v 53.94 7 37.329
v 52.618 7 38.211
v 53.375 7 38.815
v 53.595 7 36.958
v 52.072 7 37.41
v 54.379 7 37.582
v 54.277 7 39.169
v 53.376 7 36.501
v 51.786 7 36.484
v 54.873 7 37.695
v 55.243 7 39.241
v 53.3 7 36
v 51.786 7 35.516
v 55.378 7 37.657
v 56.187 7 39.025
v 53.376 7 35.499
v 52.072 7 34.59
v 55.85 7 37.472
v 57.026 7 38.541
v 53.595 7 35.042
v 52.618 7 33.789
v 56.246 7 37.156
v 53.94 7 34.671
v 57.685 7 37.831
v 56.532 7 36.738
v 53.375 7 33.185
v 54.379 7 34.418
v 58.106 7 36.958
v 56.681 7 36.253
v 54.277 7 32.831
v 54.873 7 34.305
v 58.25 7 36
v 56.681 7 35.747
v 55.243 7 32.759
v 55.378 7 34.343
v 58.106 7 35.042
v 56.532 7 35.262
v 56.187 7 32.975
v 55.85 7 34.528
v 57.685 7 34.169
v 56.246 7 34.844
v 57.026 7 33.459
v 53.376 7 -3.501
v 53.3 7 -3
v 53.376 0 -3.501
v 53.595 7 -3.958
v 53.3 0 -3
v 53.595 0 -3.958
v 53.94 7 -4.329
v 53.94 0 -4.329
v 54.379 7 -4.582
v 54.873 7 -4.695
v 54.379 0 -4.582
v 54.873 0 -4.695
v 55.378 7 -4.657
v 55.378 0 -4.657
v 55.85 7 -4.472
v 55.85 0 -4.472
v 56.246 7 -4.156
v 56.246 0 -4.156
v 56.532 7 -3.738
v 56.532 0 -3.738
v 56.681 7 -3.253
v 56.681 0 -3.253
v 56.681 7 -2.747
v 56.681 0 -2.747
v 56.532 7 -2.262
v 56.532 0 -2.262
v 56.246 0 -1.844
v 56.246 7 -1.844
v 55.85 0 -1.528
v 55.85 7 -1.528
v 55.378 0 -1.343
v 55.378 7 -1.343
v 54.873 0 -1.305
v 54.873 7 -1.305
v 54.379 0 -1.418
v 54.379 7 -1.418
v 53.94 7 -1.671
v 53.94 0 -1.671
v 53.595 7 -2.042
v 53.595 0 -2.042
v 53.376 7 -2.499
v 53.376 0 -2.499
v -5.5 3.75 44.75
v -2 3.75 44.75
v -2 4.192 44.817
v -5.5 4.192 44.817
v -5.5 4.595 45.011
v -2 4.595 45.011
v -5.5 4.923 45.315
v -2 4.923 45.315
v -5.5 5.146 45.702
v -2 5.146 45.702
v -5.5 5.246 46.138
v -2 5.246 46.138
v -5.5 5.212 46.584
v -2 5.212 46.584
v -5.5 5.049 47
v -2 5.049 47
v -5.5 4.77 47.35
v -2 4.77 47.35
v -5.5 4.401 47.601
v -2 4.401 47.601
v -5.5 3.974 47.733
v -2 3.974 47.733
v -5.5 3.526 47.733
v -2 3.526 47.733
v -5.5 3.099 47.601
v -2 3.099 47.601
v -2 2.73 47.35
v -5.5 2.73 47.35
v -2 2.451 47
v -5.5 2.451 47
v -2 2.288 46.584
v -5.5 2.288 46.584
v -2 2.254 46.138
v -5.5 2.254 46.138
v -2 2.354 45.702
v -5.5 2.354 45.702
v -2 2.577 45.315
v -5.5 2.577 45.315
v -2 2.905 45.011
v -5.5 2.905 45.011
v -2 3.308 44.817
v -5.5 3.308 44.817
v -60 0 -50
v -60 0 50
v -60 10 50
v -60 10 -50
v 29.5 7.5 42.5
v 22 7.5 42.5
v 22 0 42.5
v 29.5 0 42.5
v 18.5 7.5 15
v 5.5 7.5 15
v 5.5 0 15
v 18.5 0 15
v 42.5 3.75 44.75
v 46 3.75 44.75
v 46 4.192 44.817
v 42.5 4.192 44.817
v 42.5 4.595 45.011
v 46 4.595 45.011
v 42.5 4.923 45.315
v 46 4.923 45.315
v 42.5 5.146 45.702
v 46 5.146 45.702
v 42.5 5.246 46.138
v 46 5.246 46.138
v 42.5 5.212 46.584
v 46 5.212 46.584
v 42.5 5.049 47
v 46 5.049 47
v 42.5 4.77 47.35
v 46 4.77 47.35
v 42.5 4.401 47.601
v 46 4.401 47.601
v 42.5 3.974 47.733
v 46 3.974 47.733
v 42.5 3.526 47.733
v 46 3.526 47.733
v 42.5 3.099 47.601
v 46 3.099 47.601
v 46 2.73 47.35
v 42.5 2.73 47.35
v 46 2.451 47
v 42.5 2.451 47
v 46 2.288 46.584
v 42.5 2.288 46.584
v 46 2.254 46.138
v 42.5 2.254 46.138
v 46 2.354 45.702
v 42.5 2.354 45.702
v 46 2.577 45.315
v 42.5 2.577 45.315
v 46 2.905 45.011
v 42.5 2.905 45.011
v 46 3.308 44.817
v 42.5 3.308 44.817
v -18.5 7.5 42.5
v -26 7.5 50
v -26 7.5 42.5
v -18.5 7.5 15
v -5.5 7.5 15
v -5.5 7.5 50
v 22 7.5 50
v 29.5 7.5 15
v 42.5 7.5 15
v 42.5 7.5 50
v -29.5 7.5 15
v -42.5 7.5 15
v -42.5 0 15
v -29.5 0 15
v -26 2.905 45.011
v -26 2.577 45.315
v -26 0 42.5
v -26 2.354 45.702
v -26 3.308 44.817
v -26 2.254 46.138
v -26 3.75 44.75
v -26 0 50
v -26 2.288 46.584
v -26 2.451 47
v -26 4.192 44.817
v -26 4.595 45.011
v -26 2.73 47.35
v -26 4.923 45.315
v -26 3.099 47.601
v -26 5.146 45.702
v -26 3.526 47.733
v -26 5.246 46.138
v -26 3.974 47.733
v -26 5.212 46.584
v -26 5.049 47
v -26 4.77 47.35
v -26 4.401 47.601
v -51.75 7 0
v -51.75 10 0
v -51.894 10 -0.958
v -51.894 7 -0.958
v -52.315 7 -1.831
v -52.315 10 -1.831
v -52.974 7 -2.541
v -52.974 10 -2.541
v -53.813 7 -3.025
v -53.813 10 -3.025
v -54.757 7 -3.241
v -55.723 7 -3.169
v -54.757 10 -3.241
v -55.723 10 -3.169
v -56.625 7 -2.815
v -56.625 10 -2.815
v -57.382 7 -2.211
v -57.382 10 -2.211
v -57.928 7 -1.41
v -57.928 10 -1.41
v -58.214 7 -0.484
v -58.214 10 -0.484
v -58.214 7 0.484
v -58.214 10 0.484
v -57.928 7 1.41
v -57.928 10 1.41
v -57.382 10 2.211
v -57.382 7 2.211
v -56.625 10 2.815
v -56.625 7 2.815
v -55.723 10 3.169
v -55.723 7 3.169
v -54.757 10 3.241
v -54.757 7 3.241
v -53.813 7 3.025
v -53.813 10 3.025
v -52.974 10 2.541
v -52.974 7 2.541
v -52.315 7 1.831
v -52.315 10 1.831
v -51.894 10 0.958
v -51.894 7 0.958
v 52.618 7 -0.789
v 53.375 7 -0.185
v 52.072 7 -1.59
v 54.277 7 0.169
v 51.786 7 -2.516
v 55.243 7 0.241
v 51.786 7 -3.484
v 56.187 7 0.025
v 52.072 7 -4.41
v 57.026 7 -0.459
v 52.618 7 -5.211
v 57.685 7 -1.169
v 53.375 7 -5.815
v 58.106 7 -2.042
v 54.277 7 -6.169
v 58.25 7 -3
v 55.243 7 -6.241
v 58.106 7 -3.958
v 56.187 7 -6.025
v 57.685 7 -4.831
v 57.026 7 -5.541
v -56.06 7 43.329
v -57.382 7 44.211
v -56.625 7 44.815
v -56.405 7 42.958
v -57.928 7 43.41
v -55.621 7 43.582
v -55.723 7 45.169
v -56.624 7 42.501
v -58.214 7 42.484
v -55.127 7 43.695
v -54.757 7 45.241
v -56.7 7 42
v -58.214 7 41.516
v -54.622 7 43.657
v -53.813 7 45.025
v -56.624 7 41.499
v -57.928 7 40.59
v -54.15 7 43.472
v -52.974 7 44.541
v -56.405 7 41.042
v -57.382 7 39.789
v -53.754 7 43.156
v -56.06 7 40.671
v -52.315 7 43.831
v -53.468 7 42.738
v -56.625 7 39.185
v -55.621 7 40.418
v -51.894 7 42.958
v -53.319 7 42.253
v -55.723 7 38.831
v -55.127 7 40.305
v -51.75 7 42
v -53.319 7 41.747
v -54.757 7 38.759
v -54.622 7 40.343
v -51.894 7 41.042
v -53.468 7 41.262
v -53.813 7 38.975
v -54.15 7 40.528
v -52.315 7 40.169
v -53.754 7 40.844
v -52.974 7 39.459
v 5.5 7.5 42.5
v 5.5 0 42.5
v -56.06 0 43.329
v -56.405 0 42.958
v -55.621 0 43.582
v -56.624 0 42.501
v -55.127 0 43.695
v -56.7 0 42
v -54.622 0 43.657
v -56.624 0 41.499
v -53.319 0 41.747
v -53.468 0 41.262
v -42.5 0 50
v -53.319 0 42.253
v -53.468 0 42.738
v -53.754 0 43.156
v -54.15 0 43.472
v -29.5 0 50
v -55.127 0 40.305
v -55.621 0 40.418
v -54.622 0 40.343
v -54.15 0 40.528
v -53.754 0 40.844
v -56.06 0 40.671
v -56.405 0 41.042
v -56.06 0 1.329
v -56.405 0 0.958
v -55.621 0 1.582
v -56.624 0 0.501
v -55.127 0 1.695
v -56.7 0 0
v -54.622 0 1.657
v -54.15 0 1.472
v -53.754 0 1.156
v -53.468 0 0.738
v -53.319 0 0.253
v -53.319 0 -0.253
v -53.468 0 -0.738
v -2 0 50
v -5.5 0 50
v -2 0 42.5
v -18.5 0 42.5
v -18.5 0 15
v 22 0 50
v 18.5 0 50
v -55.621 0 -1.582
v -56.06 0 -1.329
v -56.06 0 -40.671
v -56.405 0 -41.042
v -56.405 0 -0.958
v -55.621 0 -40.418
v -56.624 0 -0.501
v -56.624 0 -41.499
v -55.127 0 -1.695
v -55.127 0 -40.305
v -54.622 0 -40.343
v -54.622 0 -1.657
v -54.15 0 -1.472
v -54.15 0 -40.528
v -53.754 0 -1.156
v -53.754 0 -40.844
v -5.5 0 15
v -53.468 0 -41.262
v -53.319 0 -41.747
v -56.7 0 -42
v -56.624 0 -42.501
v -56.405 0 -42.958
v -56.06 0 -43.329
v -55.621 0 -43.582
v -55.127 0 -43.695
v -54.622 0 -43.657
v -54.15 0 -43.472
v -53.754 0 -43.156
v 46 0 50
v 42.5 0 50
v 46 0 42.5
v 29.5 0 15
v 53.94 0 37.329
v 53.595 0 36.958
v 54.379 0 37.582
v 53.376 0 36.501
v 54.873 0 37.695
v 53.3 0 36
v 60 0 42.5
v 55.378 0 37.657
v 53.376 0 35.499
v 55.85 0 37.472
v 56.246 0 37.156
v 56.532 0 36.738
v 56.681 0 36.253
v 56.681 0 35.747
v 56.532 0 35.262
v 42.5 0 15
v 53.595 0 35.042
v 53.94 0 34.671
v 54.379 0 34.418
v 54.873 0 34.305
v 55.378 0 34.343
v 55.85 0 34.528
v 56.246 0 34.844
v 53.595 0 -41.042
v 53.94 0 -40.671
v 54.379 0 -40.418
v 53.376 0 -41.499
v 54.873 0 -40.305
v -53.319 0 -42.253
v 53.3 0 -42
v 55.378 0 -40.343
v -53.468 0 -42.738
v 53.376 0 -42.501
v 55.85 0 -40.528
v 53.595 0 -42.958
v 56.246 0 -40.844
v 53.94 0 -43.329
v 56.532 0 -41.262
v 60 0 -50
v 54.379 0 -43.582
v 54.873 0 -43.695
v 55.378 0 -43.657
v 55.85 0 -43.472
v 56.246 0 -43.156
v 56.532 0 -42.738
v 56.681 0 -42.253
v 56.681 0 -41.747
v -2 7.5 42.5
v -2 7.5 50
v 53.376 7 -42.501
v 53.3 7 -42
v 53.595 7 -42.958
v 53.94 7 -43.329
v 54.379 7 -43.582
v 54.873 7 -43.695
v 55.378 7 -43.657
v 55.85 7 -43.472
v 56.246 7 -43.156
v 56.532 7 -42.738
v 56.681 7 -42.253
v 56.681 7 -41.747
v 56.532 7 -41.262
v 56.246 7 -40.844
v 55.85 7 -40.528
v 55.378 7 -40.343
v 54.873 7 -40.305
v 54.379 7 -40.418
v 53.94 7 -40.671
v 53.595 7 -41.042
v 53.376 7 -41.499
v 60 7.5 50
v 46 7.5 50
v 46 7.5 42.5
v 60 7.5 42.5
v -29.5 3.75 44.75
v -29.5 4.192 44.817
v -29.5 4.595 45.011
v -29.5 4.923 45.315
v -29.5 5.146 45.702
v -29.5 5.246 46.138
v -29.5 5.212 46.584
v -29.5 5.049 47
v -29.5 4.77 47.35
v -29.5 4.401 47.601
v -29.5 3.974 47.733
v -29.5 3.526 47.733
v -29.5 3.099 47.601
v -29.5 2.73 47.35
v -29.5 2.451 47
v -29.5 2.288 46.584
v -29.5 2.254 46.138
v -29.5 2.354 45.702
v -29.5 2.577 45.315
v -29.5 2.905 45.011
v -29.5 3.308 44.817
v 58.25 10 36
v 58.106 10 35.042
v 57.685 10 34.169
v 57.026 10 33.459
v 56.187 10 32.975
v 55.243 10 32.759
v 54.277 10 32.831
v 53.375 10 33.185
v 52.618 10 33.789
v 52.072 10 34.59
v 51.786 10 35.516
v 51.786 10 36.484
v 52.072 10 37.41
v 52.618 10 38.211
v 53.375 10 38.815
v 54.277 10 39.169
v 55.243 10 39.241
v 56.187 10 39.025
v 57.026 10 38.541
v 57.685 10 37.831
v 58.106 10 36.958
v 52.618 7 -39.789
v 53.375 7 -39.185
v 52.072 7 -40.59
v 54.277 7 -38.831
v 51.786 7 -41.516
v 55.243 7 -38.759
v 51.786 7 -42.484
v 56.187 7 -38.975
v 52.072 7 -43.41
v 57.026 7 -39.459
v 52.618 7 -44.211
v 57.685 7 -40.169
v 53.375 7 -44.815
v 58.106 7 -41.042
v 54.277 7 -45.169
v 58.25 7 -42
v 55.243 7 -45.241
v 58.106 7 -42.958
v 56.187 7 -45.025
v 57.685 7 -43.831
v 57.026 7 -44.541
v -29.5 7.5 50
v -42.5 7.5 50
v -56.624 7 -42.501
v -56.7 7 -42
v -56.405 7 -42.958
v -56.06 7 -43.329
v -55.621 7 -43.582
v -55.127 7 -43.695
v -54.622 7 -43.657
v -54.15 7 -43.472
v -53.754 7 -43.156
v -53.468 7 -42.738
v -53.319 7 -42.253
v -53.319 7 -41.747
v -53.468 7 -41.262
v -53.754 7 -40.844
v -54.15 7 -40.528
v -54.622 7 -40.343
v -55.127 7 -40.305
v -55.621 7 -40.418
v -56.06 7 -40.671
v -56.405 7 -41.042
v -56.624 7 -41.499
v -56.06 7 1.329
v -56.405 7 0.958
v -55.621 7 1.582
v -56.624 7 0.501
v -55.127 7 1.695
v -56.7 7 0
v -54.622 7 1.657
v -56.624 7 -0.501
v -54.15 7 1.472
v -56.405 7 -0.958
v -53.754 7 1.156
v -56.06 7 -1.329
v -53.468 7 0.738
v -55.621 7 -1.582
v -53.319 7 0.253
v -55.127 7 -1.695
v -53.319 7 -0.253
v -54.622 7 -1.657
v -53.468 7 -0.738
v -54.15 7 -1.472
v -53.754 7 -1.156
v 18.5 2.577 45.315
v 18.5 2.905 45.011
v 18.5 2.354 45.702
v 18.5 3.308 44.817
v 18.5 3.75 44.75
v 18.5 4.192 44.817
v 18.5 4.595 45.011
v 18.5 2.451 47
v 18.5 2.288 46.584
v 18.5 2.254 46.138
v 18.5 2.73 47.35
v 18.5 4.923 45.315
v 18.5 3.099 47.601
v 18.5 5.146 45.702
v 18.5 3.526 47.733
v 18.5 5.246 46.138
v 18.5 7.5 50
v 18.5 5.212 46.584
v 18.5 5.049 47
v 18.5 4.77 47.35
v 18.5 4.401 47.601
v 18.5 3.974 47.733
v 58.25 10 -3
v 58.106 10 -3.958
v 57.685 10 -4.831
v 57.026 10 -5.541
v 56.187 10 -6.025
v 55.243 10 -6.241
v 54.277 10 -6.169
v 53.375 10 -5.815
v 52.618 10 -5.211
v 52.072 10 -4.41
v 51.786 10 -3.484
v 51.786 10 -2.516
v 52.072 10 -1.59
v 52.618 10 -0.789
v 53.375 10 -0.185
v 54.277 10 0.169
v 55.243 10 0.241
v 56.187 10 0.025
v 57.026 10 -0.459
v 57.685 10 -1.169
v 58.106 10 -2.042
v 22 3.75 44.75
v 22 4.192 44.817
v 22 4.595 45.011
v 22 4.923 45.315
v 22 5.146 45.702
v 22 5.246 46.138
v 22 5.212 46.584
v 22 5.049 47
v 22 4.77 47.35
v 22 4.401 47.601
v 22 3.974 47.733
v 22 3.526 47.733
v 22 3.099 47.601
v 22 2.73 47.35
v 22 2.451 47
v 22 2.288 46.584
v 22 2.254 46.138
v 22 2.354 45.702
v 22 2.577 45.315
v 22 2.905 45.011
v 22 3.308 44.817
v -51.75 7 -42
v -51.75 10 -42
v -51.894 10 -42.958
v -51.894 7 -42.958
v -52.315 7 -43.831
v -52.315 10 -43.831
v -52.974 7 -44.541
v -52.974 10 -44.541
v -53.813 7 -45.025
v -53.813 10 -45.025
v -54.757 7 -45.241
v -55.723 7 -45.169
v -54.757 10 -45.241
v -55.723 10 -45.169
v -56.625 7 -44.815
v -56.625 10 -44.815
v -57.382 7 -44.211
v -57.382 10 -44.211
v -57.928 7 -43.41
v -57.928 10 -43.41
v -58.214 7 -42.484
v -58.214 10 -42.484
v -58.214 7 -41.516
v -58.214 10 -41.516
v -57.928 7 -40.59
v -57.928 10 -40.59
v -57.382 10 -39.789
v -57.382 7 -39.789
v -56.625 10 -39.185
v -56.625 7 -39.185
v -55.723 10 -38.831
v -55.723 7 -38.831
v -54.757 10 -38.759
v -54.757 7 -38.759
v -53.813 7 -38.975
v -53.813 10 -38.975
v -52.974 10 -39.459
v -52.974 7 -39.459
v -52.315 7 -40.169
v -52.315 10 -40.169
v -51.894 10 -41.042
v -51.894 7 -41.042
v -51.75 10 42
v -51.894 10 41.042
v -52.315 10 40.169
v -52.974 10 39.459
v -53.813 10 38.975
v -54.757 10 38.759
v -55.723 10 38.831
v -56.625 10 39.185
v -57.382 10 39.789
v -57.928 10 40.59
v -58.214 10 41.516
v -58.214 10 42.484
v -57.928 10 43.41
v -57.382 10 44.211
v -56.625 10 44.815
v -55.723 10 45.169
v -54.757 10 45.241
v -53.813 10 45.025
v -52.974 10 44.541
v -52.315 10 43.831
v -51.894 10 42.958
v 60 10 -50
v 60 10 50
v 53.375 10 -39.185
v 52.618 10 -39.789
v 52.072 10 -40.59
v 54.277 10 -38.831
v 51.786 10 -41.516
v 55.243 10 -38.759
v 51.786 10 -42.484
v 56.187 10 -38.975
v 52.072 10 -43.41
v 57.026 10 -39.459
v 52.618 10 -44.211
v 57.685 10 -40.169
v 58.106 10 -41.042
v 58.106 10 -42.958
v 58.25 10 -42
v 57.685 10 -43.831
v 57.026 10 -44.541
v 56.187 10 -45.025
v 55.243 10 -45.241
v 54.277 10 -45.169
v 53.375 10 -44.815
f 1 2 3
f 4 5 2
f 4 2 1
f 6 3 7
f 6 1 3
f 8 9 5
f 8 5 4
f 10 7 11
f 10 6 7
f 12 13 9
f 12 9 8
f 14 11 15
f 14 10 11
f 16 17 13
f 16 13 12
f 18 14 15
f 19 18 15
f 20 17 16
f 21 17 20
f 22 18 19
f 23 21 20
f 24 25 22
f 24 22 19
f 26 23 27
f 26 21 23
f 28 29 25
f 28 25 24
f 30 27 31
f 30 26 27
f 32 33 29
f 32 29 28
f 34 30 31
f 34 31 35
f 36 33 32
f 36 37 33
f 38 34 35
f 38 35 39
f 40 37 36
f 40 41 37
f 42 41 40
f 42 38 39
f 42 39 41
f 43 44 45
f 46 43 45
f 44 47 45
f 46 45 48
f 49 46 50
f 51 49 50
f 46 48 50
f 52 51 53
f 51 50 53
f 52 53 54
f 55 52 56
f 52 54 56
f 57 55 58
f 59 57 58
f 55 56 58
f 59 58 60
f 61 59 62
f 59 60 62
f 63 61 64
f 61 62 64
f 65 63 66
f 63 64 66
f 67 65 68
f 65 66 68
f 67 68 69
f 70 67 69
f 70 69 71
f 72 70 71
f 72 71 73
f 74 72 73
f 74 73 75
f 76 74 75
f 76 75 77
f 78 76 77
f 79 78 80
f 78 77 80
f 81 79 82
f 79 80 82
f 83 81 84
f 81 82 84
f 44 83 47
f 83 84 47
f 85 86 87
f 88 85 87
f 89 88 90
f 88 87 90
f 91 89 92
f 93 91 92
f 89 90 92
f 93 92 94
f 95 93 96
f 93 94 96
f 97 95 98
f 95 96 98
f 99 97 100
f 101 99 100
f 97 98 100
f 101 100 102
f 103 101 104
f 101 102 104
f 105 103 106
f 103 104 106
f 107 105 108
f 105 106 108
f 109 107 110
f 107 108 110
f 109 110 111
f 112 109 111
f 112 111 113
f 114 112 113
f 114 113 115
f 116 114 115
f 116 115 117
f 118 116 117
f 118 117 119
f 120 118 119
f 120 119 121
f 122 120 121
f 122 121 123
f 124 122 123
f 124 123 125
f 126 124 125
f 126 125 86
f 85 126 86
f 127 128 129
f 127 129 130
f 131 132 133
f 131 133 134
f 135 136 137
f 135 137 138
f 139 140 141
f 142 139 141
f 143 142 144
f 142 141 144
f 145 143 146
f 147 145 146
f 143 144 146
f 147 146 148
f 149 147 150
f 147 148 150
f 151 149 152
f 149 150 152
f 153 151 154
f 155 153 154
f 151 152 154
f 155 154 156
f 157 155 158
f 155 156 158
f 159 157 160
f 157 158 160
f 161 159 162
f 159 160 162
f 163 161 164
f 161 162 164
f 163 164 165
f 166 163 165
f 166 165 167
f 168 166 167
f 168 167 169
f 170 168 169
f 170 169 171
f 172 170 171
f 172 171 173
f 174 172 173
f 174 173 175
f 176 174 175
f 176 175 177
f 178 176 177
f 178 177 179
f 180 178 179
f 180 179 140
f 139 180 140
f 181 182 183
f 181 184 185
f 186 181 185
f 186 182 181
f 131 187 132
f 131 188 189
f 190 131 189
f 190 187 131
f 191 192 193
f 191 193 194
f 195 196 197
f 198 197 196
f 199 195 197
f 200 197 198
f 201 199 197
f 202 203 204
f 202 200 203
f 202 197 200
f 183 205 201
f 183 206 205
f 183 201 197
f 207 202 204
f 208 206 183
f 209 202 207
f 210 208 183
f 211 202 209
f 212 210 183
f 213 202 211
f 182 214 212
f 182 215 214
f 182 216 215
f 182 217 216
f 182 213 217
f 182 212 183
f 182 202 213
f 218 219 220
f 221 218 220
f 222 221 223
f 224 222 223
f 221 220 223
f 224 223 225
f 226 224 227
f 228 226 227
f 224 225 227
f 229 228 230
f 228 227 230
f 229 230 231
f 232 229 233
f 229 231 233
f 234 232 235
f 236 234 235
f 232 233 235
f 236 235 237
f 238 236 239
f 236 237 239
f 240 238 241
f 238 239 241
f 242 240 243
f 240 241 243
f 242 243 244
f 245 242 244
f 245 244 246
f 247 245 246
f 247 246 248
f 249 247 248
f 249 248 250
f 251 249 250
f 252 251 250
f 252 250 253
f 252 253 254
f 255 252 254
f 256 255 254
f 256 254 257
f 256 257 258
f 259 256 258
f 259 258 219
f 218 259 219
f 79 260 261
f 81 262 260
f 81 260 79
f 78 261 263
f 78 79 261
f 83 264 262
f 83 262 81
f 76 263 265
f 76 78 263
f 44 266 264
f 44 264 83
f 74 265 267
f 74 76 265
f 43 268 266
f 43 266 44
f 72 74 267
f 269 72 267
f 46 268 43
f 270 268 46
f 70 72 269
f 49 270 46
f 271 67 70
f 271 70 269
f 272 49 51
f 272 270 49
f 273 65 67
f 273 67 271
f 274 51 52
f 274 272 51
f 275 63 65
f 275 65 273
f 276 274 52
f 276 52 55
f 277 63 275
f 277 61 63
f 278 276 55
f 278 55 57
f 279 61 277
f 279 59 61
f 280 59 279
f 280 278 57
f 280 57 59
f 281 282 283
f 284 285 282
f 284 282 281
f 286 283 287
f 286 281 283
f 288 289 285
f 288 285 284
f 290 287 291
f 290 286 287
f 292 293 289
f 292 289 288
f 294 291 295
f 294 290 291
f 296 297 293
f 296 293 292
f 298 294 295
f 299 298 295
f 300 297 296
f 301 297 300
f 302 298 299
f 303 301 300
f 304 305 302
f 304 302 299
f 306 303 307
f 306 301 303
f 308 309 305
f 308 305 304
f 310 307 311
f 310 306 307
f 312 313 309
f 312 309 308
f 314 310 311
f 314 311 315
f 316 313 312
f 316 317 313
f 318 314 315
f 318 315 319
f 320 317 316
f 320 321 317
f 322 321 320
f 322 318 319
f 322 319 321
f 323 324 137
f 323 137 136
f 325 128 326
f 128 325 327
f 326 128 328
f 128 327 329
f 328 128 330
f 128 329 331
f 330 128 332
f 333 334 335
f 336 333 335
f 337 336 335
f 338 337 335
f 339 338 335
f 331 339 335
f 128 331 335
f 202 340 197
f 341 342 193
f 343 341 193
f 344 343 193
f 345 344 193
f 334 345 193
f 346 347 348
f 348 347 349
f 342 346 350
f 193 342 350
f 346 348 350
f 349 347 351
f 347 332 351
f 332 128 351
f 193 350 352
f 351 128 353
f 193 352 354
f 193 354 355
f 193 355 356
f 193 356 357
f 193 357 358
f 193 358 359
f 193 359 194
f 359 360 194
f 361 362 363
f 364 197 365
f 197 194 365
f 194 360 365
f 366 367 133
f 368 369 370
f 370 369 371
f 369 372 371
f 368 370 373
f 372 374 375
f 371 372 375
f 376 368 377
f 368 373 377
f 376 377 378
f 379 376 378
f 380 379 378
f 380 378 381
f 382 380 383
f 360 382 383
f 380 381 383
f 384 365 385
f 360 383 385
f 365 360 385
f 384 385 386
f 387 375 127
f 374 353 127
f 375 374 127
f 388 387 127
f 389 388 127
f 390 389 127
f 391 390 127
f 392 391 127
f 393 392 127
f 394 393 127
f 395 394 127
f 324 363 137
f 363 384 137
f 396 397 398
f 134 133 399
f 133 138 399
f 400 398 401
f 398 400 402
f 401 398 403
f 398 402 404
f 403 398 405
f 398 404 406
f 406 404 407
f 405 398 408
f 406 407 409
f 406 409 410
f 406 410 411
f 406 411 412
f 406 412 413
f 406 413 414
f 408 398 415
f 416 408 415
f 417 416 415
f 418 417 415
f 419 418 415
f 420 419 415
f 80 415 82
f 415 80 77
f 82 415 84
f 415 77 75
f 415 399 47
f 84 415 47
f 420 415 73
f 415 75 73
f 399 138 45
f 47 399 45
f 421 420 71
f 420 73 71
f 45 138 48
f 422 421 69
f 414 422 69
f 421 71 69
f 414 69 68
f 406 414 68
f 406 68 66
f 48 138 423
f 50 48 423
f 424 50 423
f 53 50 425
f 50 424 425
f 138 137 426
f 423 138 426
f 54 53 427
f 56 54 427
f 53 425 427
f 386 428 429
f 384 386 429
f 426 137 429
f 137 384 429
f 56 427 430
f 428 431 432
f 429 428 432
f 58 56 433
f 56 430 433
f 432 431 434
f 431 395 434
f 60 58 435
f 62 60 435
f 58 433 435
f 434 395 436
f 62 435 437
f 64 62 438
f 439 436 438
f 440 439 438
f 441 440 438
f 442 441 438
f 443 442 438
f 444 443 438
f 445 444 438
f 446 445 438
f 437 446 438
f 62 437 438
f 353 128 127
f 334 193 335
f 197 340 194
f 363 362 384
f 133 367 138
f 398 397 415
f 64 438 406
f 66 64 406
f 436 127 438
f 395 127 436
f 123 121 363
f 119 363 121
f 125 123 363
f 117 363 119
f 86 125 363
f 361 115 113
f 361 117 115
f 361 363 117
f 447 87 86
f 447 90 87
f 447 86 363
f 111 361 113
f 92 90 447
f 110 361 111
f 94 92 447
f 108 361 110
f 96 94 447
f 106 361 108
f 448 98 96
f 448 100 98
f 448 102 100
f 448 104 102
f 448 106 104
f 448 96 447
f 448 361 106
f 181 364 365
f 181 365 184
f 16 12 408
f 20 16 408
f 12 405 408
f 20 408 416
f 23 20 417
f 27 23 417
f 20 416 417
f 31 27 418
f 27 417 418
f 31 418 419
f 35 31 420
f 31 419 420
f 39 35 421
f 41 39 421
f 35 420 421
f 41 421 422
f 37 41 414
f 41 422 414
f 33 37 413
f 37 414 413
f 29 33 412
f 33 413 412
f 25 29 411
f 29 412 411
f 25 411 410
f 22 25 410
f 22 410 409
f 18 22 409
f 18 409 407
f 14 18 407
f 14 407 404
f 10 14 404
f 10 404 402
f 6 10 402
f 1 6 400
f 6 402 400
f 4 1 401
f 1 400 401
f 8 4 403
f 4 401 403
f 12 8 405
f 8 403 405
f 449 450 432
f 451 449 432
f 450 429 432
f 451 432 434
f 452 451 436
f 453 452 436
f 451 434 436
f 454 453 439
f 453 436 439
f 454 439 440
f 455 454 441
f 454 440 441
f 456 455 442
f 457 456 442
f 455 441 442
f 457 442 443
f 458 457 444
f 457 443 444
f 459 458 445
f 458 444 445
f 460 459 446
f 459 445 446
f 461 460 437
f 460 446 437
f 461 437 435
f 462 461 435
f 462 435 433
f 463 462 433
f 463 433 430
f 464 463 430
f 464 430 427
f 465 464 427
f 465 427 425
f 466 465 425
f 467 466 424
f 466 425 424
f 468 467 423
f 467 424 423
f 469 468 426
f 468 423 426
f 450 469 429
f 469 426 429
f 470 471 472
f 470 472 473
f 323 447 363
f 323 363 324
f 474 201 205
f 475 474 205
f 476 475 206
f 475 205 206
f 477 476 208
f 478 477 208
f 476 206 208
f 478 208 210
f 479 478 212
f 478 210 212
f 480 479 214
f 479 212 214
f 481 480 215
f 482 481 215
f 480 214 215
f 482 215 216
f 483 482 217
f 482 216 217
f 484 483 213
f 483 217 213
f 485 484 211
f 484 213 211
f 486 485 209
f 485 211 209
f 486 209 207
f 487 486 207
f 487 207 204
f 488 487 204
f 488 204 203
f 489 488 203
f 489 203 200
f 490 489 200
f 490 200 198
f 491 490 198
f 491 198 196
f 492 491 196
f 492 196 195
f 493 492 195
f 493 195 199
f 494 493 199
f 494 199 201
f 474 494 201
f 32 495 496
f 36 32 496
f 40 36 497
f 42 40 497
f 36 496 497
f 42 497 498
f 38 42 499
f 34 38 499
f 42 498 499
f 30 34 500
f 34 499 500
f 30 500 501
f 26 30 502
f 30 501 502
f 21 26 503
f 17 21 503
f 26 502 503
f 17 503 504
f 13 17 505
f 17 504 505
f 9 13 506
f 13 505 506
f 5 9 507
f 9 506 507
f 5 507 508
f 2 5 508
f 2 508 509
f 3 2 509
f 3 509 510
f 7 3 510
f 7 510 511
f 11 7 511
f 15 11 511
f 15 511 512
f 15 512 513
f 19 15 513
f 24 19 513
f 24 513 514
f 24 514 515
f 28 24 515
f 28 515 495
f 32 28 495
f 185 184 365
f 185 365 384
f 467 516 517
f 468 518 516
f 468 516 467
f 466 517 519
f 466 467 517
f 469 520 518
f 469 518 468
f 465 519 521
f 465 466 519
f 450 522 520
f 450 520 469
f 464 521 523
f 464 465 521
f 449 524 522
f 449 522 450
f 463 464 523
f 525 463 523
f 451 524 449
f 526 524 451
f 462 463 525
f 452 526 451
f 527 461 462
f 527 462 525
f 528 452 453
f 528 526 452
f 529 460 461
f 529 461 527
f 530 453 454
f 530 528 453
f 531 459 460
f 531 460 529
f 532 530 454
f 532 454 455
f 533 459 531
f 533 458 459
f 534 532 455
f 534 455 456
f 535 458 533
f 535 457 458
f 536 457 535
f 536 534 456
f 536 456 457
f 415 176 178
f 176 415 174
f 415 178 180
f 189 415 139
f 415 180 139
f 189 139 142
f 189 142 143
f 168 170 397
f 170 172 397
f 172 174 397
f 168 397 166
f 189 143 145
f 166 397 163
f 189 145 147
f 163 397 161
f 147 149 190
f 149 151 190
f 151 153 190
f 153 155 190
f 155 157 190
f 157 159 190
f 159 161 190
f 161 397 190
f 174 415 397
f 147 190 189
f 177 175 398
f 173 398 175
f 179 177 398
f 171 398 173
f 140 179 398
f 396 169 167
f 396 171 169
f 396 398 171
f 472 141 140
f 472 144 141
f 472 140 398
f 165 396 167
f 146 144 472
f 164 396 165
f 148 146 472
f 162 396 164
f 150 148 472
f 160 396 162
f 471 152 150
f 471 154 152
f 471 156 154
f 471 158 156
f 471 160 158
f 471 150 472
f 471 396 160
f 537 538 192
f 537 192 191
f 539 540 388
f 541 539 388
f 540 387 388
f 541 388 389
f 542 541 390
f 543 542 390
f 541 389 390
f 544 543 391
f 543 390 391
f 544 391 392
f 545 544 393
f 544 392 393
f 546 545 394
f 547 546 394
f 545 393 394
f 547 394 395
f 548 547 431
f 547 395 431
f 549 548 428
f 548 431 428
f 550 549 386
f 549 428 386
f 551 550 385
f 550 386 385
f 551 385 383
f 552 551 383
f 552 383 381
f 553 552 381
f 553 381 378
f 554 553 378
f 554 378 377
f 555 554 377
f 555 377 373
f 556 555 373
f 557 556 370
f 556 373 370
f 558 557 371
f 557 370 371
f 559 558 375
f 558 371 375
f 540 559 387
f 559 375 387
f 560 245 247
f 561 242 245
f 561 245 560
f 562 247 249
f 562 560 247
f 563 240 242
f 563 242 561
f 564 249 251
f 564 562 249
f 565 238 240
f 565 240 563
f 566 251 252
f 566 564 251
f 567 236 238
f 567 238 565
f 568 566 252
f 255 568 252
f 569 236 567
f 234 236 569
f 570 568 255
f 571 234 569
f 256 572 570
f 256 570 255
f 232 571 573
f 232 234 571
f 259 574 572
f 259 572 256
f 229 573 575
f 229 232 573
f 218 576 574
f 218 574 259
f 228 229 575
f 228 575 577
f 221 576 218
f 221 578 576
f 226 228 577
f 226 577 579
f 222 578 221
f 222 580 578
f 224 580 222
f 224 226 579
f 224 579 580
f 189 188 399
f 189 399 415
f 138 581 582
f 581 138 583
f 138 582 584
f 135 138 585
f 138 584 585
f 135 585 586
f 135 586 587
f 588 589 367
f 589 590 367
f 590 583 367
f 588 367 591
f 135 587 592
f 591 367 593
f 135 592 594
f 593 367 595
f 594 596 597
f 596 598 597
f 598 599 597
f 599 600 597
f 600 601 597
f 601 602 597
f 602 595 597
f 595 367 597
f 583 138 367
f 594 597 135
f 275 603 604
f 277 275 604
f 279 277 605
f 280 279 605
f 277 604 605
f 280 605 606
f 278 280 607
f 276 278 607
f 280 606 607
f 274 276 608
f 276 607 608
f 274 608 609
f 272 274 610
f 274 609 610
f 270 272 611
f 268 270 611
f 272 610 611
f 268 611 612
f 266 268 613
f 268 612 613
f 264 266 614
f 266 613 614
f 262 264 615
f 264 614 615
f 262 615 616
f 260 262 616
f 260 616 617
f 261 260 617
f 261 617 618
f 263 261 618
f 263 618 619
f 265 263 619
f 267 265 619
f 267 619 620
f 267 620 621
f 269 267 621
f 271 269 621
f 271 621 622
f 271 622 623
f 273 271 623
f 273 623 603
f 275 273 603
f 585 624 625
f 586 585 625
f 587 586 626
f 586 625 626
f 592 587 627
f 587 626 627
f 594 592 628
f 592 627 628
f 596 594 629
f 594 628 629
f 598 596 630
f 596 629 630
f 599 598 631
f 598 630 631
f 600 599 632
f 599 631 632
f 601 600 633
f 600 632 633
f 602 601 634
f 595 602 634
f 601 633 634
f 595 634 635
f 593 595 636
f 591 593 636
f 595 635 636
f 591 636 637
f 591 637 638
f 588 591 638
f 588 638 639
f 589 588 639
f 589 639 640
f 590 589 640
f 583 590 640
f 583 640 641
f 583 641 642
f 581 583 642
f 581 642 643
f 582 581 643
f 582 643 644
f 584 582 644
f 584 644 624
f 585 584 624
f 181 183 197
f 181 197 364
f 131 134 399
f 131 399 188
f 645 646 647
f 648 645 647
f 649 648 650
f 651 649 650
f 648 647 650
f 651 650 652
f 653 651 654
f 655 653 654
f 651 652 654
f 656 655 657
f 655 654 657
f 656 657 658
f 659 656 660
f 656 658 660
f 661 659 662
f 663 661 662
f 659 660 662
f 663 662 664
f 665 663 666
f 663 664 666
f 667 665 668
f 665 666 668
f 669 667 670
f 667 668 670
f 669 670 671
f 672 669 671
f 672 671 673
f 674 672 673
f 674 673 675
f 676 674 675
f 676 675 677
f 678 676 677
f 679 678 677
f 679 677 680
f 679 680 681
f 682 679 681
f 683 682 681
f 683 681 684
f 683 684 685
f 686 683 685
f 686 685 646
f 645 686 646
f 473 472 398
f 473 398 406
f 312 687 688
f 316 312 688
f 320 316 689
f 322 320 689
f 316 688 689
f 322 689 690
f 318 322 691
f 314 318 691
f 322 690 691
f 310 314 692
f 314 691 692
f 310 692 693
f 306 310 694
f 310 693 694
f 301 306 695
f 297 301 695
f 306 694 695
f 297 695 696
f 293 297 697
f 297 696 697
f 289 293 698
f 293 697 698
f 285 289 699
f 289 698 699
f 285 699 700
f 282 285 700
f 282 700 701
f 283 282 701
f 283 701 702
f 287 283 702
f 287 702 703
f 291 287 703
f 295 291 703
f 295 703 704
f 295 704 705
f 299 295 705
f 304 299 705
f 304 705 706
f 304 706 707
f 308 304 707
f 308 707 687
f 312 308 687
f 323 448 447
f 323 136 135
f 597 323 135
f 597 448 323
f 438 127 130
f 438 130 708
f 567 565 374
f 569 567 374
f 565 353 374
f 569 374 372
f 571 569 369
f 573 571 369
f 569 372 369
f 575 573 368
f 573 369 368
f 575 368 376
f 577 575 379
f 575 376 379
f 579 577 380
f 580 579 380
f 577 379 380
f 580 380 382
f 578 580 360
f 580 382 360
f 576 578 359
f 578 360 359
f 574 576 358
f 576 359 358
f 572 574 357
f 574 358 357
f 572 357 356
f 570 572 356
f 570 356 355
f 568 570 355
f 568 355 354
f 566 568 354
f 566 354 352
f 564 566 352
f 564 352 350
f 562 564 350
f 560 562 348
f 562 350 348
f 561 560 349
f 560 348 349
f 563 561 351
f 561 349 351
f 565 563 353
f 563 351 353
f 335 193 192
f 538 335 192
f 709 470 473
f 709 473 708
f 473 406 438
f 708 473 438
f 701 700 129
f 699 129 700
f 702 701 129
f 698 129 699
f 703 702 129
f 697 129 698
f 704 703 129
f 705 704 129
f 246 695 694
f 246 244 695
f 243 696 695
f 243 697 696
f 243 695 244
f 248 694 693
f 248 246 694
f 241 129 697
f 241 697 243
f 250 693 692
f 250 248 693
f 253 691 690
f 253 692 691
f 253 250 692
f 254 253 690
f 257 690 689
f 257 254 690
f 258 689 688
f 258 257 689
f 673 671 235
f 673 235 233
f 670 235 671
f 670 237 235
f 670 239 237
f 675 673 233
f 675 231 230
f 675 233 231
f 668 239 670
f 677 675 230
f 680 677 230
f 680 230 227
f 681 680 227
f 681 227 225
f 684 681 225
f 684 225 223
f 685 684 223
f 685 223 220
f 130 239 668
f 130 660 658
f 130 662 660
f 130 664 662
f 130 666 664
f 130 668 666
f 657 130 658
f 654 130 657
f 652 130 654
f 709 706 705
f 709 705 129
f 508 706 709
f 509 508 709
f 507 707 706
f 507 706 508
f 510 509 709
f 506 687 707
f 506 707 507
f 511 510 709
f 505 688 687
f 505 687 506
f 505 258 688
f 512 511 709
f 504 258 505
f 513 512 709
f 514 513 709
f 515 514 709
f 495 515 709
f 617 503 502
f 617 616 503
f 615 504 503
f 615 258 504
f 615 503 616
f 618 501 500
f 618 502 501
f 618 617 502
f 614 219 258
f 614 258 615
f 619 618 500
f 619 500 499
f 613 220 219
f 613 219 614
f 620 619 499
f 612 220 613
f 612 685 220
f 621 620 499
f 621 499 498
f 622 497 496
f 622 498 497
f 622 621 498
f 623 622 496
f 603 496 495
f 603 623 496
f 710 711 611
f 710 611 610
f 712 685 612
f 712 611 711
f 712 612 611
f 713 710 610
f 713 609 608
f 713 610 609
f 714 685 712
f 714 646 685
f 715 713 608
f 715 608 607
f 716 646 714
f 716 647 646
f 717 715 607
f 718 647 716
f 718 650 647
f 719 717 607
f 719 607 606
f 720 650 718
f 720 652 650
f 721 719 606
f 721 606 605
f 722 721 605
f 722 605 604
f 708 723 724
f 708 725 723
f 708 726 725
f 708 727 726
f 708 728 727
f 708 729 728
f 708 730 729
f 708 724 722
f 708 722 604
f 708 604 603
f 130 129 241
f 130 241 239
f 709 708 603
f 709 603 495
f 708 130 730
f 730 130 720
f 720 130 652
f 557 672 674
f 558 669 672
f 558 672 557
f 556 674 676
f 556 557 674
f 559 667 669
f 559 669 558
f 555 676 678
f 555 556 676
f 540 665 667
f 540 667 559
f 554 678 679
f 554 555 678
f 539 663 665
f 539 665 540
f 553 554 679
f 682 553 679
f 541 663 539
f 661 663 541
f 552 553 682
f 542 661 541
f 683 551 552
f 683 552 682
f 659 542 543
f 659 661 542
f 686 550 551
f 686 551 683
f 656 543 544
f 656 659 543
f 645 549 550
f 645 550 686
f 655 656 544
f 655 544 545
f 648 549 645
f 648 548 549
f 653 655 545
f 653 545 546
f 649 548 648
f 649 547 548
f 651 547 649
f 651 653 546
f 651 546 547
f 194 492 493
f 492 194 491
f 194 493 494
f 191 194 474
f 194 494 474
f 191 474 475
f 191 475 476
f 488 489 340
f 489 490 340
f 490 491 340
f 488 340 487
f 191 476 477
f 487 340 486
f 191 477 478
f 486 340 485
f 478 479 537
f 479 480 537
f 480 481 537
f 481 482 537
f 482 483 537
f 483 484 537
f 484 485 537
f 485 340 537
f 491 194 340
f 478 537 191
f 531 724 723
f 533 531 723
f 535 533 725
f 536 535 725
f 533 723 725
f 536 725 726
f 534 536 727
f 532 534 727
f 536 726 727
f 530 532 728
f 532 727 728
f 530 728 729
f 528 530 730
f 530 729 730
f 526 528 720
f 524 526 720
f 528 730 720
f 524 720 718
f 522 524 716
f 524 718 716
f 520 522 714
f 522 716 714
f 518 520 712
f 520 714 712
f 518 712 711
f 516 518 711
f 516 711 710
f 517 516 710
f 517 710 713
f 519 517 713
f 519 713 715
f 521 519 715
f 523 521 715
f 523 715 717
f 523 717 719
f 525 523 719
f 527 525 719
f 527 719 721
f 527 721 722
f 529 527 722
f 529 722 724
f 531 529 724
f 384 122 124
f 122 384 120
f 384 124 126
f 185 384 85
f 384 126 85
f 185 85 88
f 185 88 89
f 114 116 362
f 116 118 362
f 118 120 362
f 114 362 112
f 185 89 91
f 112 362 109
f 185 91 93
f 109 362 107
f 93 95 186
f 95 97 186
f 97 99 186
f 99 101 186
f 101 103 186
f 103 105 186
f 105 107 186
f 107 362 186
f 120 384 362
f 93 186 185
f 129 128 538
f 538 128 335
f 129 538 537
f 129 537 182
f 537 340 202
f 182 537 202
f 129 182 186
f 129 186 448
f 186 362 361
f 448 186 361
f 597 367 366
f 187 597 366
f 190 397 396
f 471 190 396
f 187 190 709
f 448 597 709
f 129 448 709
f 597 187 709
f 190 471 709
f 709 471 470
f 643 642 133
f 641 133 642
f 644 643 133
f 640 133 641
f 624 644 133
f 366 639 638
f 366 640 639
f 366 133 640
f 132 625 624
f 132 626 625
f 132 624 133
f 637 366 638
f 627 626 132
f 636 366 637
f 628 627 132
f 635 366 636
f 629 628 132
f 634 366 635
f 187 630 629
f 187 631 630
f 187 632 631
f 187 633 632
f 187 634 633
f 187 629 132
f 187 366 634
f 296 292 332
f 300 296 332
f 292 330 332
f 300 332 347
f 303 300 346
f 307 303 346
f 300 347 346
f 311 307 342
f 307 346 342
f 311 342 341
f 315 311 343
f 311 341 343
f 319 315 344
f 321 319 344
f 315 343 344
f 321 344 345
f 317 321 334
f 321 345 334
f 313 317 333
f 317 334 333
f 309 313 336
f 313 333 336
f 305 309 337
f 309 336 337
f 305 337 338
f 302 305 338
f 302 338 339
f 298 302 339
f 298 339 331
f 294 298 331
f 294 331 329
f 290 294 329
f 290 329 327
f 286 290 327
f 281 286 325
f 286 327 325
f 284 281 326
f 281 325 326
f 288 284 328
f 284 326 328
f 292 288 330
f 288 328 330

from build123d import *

# Parameters (mm, degrees)
SKETCH1_W                     = 120
SKETCH1_H                     = 100
BOSS_EXTRUDE1_DEPTH           = 10
SKETCH2_W                     = 13
SKETCH2_H                     = 15
CUT_EXTRUDE1_DEPTH            = 35
SKETCH3_W                     = 7.5
SKETCH3_H                     = 7.5
SKETCH3_W_2                   = 14
CUT_EXTRUDE2_DEPTH            = 7.5
SKETCH4_R                     = 1.5
CUT_EXTRUDE3_DEPTH            = 75.5
CBORE_FOR_M3_SHCS_D           = 3.4
CBORE_FOR_M3_SHCS_DEPTH       = 23
CBORE_FOR_M3_SHCS_CBORE_D     = 6.5
CBORE_FOR_M3_SHCS_CBORE_DEPTH = 3
CBORE_FOR_M3_SHCS_TIP         = 1.021463052


with BuildPart() as part:
    # Sketch1 → Boss-Extrude1 (new body)
    with BuildSketch(Plane(origin=(0, 0, 0), x_dir=(1, 0, 0), z_dir=(0, 1, 0))):
        Rectangle(SKETCH1_W, SKETCH1_H)
    extrude(amount=BOSS_EXTRUDE1_DEPTH)

    # Sketch2 → Cut-Extrude1 (cut)
    with BuildSketch(Plane.XY.offset(50)):
        with Locations((-36, 0)):
            Rectangle(SKETCH2_W, SKETCH2_H)
        with Locations((-12, 0)):
            Rectangle(SKETCH2_W, SKETCH2_H)
        with Locations((12, 0)):
            Rectangle(SKETCH2_W, SKETCH2_H)
        with Locations((36, 0)):
            Rectangle(SKETCH2_W, SKETCH2_H)
    extrude(amount=-CUT_EXTRUDE1_DEPTH, mode=Mode.SUBTRACT)

    # Sketch3 → Cut-Extrude2 (cut)
    with BuildSketch(Plane.XY.offset(50)):
        with Locations((-22.25, 3.75)):
            Rectangle(SKETCH3_W, SKETCH3_H)
        with Locations((1.75, 3.75)):
            Rectangle(SKETCH3_W, SKETCH3_H)
        with Locations((25.75, 3.75)):
            Rectangle(SKETCH3_W, SKETCH3_H)
        with Locations((53, 3.75)):
            Rectangle(SKETCH3_W_2, SKETCH3_H)
    extrude(amount=-CUT_EXTRUDE2_DEPTH, mode=Mode.SUBTRACT)

    # Sketch4 → Cut-Extrude3 (cut)
    with BuildSketch(Plane(origin=(46, 0, 0), x_dir=(0, 0, -1), z_dir=(1, 0, 0))):
        with Locations((-46.25, 3.75)):
            Circle(SKETCH4_R)
    extrude(amount=-CUT_EXTRUDE3_DEPTH, mode=Mode.SUBTRACT)

    # CBORE for M3 SHCS
    with Locations(Plane(origin=(-676.293536786, 10, -1323.282701689), x_dir=(1, 0, 0), z_dir=(0, 1, 0))):
        with Locations((731.293536786, -1281.282701689), (731.293536786, -1359.282701689), (621.293536786, -1281.282701689), (621.293536786, -1365.282701689), (621.293536786, -1323.282701689), (731.293536786, -1320.282701689)):
            CounterBoreHole(CBORE_FOR_M3_SHCS_D / 2, CBORE_FOR_M3_SHCS_CBORE_D / 2, CBORE_FOR_M3_SHCS_CBORE_DEPTH, depth=CBORE_FOR_M3_SHCS_DEPTH)
            with Locations((0, 0, -(CBORE_FOR_M3_SHCS_DEPTH + CBORE_FOR_M3_SHCS_TIP / 2))):  # 118° drill point
                Cone(0, CBORE_FOR_M3_SHCS_D / 2, CBORE_FOR_M3_SHCS_TIP, mode=Mode.SUBTRACT)


solid = part.part
